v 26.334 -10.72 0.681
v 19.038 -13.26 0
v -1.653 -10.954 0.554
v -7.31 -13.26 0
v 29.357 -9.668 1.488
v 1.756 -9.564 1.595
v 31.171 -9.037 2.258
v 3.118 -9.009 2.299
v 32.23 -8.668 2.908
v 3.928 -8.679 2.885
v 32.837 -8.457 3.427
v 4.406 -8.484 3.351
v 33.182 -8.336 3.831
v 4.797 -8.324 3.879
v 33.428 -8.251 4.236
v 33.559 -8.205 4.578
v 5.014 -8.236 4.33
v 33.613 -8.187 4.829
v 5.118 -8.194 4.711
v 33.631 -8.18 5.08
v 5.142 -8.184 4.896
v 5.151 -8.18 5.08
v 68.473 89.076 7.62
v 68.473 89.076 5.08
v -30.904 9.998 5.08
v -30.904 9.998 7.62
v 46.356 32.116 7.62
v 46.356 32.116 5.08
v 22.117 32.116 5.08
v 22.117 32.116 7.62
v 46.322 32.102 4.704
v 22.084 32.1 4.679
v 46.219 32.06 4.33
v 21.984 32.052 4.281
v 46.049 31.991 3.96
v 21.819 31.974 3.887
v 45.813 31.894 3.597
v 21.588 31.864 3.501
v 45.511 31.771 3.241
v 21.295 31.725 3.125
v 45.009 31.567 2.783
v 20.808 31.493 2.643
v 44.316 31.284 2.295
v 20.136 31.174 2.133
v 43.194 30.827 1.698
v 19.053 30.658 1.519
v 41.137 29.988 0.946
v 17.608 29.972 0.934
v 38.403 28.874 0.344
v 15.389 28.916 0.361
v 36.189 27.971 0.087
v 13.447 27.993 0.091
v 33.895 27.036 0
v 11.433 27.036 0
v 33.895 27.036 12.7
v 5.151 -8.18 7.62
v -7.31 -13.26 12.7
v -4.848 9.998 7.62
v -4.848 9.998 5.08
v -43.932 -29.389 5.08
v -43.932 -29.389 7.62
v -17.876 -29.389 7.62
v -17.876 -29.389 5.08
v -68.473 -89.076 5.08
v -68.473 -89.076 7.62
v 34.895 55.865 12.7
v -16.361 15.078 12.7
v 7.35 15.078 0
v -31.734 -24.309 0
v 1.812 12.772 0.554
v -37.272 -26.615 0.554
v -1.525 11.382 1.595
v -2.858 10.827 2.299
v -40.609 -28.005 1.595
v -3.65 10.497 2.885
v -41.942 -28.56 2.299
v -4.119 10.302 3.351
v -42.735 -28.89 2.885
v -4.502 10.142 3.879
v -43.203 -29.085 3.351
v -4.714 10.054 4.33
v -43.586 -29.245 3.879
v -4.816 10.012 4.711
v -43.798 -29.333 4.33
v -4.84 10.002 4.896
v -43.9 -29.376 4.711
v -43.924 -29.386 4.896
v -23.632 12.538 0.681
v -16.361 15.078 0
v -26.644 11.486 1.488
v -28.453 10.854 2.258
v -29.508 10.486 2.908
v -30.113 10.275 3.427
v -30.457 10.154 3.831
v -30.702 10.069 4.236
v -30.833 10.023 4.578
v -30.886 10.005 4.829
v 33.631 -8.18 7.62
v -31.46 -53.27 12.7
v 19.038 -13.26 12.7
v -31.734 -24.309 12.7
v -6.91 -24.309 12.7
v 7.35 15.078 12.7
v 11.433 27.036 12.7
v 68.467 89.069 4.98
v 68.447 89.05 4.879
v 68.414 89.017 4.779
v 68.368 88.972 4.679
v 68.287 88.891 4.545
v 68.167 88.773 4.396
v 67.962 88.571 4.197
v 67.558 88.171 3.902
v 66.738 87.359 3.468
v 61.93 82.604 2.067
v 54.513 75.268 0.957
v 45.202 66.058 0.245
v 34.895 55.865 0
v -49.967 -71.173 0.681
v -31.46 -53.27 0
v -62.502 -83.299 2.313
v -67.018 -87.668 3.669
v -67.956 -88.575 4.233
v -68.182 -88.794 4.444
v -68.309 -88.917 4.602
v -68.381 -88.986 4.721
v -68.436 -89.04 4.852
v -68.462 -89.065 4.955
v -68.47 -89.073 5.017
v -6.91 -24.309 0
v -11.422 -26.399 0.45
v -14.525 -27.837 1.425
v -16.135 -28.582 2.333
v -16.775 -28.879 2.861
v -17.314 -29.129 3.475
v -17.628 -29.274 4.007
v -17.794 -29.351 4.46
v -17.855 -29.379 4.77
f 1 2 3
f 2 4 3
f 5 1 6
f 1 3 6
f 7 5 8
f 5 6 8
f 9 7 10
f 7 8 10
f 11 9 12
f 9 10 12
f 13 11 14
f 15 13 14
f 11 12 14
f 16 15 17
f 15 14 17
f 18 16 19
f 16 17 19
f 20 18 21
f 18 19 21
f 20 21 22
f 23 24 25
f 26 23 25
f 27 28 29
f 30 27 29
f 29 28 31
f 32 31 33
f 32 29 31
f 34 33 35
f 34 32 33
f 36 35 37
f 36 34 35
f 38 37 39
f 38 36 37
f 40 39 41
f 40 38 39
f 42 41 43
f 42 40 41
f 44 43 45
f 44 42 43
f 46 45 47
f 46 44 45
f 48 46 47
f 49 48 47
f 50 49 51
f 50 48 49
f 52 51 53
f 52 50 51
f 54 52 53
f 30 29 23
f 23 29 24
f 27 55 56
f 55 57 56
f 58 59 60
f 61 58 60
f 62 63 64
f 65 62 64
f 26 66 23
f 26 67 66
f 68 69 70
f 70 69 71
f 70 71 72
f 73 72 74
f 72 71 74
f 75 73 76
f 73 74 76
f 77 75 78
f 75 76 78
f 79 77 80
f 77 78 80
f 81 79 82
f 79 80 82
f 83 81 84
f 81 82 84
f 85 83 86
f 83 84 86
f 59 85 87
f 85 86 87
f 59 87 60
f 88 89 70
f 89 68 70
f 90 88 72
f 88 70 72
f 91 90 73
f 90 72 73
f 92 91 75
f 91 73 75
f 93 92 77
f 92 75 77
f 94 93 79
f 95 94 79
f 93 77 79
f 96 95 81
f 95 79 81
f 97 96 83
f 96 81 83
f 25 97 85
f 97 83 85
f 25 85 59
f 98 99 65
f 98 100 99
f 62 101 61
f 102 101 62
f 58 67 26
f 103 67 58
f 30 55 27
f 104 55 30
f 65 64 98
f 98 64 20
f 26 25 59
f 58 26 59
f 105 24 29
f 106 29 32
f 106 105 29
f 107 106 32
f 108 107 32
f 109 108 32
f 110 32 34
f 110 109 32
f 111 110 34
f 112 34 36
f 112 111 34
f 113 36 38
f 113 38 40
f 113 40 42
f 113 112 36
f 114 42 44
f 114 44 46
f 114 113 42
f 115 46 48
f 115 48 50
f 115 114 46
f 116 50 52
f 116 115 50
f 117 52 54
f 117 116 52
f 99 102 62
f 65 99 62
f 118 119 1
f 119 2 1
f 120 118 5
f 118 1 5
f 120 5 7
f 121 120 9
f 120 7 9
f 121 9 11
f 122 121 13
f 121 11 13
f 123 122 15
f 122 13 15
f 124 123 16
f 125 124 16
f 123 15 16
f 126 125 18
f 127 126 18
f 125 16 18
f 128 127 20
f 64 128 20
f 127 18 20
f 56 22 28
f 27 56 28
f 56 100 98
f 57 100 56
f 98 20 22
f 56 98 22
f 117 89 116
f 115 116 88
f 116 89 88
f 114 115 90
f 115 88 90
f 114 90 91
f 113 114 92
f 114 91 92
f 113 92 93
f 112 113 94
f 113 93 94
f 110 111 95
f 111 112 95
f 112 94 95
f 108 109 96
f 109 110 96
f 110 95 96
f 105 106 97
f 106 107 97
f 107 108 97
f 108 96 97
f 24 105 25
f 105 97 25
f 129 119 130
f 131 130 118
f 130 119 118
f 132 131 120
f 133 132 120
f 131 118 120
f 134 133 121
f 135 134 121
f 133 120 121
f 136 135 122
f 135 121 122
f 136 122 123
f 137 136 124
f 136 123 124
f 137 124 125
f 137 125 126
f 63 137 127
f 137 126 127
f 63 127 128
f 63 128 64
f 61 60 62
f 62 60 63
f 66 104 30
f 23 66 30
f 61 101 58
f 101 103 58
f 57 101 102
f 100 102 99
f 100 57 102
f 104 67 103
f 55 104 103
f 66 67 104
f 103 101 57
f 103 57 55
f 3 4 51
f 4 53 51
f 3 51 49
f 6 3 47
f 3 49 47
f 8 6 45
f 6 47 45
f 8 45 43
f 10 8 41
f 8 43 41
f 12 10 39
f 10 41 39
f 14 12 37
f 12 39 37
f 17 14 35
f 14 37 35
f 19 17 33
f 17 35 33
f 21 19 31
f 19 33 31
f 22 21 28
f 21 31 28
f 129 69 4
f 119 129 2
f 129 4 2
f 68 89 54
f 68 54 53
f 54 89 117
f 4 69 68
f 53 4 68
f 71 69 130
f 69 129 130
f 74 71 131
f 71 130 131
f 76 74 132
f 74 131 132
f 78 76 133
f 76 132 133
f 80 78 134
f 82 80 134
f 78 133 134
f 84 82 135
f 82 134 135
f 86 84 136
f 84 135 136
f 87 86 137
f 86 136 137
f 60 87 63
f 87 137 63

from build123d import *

# Parameters (mm, degrees)
F1_DEPTH = 12.7
F2_SIZE  = 5.08
F3_R     = 5.08


with BuildPart() as f1:
    # F0 (on Top) → F1 (new body)
    with BuildSketch(Plane.XY):
        Polygon((22.117395, 32.115713), (68.473089, 89.075649), (-30.903824, 9.998288), (-4.847682, 9.998288), (-43.931895, -29.388905), (-17.875753, -29.388905), (-68.473148, -89.075649), (33.630579, -8.180417), (5.150606, -8.180417), (46.355669, 32.115713), align=None)
    extrude(amount=F1_DEPTH)

    # F2
    f2_edges = [f1.edges().sort_by_distance(p)[0] for p in [
        (34.236532, 32.115713, 12.7),
        (45.295242, 60.595681, 12.7),
        (18.784632, 49.536968, 12.7),
        (-17.875753, 9.998288, 12.7),
        (-24.389789, -9.695309, 12.7),
        (-30.903824, -29.388905, 12.7),
        (-43.174451, -59.232277, 12.7),
        (-17.421285, -48.628033, 12.7),
        (19.390592, -8.180417, 12.7),
        (25.753137, 11.967648, 12.7),
    ]]
    chamfer(f2_edges, length=F2_SIZE)

    # F3
    f3_edges = [f1.edges().sort_by_distance(p)[0] for p in [
        (34.236532, 32.115713, 0),
        (45.295242, 60.595681, 0),
        (18.784632, 49.536968, 0),
        (-17.875753, 9.998288, 0),
        (-24.389789, -9.695309, 0),
        (-30.903824, -29.388905, 0),
        (-43.174451, -59.232277, 0),
        (-17.421285, -48.628033, 0),
        (19.390592, -8.180417, 0),
        (25.753137, 11.967648, 0),
    ]]
    fillet(f3_edges, radius=F3_R)


solid = f1.part
